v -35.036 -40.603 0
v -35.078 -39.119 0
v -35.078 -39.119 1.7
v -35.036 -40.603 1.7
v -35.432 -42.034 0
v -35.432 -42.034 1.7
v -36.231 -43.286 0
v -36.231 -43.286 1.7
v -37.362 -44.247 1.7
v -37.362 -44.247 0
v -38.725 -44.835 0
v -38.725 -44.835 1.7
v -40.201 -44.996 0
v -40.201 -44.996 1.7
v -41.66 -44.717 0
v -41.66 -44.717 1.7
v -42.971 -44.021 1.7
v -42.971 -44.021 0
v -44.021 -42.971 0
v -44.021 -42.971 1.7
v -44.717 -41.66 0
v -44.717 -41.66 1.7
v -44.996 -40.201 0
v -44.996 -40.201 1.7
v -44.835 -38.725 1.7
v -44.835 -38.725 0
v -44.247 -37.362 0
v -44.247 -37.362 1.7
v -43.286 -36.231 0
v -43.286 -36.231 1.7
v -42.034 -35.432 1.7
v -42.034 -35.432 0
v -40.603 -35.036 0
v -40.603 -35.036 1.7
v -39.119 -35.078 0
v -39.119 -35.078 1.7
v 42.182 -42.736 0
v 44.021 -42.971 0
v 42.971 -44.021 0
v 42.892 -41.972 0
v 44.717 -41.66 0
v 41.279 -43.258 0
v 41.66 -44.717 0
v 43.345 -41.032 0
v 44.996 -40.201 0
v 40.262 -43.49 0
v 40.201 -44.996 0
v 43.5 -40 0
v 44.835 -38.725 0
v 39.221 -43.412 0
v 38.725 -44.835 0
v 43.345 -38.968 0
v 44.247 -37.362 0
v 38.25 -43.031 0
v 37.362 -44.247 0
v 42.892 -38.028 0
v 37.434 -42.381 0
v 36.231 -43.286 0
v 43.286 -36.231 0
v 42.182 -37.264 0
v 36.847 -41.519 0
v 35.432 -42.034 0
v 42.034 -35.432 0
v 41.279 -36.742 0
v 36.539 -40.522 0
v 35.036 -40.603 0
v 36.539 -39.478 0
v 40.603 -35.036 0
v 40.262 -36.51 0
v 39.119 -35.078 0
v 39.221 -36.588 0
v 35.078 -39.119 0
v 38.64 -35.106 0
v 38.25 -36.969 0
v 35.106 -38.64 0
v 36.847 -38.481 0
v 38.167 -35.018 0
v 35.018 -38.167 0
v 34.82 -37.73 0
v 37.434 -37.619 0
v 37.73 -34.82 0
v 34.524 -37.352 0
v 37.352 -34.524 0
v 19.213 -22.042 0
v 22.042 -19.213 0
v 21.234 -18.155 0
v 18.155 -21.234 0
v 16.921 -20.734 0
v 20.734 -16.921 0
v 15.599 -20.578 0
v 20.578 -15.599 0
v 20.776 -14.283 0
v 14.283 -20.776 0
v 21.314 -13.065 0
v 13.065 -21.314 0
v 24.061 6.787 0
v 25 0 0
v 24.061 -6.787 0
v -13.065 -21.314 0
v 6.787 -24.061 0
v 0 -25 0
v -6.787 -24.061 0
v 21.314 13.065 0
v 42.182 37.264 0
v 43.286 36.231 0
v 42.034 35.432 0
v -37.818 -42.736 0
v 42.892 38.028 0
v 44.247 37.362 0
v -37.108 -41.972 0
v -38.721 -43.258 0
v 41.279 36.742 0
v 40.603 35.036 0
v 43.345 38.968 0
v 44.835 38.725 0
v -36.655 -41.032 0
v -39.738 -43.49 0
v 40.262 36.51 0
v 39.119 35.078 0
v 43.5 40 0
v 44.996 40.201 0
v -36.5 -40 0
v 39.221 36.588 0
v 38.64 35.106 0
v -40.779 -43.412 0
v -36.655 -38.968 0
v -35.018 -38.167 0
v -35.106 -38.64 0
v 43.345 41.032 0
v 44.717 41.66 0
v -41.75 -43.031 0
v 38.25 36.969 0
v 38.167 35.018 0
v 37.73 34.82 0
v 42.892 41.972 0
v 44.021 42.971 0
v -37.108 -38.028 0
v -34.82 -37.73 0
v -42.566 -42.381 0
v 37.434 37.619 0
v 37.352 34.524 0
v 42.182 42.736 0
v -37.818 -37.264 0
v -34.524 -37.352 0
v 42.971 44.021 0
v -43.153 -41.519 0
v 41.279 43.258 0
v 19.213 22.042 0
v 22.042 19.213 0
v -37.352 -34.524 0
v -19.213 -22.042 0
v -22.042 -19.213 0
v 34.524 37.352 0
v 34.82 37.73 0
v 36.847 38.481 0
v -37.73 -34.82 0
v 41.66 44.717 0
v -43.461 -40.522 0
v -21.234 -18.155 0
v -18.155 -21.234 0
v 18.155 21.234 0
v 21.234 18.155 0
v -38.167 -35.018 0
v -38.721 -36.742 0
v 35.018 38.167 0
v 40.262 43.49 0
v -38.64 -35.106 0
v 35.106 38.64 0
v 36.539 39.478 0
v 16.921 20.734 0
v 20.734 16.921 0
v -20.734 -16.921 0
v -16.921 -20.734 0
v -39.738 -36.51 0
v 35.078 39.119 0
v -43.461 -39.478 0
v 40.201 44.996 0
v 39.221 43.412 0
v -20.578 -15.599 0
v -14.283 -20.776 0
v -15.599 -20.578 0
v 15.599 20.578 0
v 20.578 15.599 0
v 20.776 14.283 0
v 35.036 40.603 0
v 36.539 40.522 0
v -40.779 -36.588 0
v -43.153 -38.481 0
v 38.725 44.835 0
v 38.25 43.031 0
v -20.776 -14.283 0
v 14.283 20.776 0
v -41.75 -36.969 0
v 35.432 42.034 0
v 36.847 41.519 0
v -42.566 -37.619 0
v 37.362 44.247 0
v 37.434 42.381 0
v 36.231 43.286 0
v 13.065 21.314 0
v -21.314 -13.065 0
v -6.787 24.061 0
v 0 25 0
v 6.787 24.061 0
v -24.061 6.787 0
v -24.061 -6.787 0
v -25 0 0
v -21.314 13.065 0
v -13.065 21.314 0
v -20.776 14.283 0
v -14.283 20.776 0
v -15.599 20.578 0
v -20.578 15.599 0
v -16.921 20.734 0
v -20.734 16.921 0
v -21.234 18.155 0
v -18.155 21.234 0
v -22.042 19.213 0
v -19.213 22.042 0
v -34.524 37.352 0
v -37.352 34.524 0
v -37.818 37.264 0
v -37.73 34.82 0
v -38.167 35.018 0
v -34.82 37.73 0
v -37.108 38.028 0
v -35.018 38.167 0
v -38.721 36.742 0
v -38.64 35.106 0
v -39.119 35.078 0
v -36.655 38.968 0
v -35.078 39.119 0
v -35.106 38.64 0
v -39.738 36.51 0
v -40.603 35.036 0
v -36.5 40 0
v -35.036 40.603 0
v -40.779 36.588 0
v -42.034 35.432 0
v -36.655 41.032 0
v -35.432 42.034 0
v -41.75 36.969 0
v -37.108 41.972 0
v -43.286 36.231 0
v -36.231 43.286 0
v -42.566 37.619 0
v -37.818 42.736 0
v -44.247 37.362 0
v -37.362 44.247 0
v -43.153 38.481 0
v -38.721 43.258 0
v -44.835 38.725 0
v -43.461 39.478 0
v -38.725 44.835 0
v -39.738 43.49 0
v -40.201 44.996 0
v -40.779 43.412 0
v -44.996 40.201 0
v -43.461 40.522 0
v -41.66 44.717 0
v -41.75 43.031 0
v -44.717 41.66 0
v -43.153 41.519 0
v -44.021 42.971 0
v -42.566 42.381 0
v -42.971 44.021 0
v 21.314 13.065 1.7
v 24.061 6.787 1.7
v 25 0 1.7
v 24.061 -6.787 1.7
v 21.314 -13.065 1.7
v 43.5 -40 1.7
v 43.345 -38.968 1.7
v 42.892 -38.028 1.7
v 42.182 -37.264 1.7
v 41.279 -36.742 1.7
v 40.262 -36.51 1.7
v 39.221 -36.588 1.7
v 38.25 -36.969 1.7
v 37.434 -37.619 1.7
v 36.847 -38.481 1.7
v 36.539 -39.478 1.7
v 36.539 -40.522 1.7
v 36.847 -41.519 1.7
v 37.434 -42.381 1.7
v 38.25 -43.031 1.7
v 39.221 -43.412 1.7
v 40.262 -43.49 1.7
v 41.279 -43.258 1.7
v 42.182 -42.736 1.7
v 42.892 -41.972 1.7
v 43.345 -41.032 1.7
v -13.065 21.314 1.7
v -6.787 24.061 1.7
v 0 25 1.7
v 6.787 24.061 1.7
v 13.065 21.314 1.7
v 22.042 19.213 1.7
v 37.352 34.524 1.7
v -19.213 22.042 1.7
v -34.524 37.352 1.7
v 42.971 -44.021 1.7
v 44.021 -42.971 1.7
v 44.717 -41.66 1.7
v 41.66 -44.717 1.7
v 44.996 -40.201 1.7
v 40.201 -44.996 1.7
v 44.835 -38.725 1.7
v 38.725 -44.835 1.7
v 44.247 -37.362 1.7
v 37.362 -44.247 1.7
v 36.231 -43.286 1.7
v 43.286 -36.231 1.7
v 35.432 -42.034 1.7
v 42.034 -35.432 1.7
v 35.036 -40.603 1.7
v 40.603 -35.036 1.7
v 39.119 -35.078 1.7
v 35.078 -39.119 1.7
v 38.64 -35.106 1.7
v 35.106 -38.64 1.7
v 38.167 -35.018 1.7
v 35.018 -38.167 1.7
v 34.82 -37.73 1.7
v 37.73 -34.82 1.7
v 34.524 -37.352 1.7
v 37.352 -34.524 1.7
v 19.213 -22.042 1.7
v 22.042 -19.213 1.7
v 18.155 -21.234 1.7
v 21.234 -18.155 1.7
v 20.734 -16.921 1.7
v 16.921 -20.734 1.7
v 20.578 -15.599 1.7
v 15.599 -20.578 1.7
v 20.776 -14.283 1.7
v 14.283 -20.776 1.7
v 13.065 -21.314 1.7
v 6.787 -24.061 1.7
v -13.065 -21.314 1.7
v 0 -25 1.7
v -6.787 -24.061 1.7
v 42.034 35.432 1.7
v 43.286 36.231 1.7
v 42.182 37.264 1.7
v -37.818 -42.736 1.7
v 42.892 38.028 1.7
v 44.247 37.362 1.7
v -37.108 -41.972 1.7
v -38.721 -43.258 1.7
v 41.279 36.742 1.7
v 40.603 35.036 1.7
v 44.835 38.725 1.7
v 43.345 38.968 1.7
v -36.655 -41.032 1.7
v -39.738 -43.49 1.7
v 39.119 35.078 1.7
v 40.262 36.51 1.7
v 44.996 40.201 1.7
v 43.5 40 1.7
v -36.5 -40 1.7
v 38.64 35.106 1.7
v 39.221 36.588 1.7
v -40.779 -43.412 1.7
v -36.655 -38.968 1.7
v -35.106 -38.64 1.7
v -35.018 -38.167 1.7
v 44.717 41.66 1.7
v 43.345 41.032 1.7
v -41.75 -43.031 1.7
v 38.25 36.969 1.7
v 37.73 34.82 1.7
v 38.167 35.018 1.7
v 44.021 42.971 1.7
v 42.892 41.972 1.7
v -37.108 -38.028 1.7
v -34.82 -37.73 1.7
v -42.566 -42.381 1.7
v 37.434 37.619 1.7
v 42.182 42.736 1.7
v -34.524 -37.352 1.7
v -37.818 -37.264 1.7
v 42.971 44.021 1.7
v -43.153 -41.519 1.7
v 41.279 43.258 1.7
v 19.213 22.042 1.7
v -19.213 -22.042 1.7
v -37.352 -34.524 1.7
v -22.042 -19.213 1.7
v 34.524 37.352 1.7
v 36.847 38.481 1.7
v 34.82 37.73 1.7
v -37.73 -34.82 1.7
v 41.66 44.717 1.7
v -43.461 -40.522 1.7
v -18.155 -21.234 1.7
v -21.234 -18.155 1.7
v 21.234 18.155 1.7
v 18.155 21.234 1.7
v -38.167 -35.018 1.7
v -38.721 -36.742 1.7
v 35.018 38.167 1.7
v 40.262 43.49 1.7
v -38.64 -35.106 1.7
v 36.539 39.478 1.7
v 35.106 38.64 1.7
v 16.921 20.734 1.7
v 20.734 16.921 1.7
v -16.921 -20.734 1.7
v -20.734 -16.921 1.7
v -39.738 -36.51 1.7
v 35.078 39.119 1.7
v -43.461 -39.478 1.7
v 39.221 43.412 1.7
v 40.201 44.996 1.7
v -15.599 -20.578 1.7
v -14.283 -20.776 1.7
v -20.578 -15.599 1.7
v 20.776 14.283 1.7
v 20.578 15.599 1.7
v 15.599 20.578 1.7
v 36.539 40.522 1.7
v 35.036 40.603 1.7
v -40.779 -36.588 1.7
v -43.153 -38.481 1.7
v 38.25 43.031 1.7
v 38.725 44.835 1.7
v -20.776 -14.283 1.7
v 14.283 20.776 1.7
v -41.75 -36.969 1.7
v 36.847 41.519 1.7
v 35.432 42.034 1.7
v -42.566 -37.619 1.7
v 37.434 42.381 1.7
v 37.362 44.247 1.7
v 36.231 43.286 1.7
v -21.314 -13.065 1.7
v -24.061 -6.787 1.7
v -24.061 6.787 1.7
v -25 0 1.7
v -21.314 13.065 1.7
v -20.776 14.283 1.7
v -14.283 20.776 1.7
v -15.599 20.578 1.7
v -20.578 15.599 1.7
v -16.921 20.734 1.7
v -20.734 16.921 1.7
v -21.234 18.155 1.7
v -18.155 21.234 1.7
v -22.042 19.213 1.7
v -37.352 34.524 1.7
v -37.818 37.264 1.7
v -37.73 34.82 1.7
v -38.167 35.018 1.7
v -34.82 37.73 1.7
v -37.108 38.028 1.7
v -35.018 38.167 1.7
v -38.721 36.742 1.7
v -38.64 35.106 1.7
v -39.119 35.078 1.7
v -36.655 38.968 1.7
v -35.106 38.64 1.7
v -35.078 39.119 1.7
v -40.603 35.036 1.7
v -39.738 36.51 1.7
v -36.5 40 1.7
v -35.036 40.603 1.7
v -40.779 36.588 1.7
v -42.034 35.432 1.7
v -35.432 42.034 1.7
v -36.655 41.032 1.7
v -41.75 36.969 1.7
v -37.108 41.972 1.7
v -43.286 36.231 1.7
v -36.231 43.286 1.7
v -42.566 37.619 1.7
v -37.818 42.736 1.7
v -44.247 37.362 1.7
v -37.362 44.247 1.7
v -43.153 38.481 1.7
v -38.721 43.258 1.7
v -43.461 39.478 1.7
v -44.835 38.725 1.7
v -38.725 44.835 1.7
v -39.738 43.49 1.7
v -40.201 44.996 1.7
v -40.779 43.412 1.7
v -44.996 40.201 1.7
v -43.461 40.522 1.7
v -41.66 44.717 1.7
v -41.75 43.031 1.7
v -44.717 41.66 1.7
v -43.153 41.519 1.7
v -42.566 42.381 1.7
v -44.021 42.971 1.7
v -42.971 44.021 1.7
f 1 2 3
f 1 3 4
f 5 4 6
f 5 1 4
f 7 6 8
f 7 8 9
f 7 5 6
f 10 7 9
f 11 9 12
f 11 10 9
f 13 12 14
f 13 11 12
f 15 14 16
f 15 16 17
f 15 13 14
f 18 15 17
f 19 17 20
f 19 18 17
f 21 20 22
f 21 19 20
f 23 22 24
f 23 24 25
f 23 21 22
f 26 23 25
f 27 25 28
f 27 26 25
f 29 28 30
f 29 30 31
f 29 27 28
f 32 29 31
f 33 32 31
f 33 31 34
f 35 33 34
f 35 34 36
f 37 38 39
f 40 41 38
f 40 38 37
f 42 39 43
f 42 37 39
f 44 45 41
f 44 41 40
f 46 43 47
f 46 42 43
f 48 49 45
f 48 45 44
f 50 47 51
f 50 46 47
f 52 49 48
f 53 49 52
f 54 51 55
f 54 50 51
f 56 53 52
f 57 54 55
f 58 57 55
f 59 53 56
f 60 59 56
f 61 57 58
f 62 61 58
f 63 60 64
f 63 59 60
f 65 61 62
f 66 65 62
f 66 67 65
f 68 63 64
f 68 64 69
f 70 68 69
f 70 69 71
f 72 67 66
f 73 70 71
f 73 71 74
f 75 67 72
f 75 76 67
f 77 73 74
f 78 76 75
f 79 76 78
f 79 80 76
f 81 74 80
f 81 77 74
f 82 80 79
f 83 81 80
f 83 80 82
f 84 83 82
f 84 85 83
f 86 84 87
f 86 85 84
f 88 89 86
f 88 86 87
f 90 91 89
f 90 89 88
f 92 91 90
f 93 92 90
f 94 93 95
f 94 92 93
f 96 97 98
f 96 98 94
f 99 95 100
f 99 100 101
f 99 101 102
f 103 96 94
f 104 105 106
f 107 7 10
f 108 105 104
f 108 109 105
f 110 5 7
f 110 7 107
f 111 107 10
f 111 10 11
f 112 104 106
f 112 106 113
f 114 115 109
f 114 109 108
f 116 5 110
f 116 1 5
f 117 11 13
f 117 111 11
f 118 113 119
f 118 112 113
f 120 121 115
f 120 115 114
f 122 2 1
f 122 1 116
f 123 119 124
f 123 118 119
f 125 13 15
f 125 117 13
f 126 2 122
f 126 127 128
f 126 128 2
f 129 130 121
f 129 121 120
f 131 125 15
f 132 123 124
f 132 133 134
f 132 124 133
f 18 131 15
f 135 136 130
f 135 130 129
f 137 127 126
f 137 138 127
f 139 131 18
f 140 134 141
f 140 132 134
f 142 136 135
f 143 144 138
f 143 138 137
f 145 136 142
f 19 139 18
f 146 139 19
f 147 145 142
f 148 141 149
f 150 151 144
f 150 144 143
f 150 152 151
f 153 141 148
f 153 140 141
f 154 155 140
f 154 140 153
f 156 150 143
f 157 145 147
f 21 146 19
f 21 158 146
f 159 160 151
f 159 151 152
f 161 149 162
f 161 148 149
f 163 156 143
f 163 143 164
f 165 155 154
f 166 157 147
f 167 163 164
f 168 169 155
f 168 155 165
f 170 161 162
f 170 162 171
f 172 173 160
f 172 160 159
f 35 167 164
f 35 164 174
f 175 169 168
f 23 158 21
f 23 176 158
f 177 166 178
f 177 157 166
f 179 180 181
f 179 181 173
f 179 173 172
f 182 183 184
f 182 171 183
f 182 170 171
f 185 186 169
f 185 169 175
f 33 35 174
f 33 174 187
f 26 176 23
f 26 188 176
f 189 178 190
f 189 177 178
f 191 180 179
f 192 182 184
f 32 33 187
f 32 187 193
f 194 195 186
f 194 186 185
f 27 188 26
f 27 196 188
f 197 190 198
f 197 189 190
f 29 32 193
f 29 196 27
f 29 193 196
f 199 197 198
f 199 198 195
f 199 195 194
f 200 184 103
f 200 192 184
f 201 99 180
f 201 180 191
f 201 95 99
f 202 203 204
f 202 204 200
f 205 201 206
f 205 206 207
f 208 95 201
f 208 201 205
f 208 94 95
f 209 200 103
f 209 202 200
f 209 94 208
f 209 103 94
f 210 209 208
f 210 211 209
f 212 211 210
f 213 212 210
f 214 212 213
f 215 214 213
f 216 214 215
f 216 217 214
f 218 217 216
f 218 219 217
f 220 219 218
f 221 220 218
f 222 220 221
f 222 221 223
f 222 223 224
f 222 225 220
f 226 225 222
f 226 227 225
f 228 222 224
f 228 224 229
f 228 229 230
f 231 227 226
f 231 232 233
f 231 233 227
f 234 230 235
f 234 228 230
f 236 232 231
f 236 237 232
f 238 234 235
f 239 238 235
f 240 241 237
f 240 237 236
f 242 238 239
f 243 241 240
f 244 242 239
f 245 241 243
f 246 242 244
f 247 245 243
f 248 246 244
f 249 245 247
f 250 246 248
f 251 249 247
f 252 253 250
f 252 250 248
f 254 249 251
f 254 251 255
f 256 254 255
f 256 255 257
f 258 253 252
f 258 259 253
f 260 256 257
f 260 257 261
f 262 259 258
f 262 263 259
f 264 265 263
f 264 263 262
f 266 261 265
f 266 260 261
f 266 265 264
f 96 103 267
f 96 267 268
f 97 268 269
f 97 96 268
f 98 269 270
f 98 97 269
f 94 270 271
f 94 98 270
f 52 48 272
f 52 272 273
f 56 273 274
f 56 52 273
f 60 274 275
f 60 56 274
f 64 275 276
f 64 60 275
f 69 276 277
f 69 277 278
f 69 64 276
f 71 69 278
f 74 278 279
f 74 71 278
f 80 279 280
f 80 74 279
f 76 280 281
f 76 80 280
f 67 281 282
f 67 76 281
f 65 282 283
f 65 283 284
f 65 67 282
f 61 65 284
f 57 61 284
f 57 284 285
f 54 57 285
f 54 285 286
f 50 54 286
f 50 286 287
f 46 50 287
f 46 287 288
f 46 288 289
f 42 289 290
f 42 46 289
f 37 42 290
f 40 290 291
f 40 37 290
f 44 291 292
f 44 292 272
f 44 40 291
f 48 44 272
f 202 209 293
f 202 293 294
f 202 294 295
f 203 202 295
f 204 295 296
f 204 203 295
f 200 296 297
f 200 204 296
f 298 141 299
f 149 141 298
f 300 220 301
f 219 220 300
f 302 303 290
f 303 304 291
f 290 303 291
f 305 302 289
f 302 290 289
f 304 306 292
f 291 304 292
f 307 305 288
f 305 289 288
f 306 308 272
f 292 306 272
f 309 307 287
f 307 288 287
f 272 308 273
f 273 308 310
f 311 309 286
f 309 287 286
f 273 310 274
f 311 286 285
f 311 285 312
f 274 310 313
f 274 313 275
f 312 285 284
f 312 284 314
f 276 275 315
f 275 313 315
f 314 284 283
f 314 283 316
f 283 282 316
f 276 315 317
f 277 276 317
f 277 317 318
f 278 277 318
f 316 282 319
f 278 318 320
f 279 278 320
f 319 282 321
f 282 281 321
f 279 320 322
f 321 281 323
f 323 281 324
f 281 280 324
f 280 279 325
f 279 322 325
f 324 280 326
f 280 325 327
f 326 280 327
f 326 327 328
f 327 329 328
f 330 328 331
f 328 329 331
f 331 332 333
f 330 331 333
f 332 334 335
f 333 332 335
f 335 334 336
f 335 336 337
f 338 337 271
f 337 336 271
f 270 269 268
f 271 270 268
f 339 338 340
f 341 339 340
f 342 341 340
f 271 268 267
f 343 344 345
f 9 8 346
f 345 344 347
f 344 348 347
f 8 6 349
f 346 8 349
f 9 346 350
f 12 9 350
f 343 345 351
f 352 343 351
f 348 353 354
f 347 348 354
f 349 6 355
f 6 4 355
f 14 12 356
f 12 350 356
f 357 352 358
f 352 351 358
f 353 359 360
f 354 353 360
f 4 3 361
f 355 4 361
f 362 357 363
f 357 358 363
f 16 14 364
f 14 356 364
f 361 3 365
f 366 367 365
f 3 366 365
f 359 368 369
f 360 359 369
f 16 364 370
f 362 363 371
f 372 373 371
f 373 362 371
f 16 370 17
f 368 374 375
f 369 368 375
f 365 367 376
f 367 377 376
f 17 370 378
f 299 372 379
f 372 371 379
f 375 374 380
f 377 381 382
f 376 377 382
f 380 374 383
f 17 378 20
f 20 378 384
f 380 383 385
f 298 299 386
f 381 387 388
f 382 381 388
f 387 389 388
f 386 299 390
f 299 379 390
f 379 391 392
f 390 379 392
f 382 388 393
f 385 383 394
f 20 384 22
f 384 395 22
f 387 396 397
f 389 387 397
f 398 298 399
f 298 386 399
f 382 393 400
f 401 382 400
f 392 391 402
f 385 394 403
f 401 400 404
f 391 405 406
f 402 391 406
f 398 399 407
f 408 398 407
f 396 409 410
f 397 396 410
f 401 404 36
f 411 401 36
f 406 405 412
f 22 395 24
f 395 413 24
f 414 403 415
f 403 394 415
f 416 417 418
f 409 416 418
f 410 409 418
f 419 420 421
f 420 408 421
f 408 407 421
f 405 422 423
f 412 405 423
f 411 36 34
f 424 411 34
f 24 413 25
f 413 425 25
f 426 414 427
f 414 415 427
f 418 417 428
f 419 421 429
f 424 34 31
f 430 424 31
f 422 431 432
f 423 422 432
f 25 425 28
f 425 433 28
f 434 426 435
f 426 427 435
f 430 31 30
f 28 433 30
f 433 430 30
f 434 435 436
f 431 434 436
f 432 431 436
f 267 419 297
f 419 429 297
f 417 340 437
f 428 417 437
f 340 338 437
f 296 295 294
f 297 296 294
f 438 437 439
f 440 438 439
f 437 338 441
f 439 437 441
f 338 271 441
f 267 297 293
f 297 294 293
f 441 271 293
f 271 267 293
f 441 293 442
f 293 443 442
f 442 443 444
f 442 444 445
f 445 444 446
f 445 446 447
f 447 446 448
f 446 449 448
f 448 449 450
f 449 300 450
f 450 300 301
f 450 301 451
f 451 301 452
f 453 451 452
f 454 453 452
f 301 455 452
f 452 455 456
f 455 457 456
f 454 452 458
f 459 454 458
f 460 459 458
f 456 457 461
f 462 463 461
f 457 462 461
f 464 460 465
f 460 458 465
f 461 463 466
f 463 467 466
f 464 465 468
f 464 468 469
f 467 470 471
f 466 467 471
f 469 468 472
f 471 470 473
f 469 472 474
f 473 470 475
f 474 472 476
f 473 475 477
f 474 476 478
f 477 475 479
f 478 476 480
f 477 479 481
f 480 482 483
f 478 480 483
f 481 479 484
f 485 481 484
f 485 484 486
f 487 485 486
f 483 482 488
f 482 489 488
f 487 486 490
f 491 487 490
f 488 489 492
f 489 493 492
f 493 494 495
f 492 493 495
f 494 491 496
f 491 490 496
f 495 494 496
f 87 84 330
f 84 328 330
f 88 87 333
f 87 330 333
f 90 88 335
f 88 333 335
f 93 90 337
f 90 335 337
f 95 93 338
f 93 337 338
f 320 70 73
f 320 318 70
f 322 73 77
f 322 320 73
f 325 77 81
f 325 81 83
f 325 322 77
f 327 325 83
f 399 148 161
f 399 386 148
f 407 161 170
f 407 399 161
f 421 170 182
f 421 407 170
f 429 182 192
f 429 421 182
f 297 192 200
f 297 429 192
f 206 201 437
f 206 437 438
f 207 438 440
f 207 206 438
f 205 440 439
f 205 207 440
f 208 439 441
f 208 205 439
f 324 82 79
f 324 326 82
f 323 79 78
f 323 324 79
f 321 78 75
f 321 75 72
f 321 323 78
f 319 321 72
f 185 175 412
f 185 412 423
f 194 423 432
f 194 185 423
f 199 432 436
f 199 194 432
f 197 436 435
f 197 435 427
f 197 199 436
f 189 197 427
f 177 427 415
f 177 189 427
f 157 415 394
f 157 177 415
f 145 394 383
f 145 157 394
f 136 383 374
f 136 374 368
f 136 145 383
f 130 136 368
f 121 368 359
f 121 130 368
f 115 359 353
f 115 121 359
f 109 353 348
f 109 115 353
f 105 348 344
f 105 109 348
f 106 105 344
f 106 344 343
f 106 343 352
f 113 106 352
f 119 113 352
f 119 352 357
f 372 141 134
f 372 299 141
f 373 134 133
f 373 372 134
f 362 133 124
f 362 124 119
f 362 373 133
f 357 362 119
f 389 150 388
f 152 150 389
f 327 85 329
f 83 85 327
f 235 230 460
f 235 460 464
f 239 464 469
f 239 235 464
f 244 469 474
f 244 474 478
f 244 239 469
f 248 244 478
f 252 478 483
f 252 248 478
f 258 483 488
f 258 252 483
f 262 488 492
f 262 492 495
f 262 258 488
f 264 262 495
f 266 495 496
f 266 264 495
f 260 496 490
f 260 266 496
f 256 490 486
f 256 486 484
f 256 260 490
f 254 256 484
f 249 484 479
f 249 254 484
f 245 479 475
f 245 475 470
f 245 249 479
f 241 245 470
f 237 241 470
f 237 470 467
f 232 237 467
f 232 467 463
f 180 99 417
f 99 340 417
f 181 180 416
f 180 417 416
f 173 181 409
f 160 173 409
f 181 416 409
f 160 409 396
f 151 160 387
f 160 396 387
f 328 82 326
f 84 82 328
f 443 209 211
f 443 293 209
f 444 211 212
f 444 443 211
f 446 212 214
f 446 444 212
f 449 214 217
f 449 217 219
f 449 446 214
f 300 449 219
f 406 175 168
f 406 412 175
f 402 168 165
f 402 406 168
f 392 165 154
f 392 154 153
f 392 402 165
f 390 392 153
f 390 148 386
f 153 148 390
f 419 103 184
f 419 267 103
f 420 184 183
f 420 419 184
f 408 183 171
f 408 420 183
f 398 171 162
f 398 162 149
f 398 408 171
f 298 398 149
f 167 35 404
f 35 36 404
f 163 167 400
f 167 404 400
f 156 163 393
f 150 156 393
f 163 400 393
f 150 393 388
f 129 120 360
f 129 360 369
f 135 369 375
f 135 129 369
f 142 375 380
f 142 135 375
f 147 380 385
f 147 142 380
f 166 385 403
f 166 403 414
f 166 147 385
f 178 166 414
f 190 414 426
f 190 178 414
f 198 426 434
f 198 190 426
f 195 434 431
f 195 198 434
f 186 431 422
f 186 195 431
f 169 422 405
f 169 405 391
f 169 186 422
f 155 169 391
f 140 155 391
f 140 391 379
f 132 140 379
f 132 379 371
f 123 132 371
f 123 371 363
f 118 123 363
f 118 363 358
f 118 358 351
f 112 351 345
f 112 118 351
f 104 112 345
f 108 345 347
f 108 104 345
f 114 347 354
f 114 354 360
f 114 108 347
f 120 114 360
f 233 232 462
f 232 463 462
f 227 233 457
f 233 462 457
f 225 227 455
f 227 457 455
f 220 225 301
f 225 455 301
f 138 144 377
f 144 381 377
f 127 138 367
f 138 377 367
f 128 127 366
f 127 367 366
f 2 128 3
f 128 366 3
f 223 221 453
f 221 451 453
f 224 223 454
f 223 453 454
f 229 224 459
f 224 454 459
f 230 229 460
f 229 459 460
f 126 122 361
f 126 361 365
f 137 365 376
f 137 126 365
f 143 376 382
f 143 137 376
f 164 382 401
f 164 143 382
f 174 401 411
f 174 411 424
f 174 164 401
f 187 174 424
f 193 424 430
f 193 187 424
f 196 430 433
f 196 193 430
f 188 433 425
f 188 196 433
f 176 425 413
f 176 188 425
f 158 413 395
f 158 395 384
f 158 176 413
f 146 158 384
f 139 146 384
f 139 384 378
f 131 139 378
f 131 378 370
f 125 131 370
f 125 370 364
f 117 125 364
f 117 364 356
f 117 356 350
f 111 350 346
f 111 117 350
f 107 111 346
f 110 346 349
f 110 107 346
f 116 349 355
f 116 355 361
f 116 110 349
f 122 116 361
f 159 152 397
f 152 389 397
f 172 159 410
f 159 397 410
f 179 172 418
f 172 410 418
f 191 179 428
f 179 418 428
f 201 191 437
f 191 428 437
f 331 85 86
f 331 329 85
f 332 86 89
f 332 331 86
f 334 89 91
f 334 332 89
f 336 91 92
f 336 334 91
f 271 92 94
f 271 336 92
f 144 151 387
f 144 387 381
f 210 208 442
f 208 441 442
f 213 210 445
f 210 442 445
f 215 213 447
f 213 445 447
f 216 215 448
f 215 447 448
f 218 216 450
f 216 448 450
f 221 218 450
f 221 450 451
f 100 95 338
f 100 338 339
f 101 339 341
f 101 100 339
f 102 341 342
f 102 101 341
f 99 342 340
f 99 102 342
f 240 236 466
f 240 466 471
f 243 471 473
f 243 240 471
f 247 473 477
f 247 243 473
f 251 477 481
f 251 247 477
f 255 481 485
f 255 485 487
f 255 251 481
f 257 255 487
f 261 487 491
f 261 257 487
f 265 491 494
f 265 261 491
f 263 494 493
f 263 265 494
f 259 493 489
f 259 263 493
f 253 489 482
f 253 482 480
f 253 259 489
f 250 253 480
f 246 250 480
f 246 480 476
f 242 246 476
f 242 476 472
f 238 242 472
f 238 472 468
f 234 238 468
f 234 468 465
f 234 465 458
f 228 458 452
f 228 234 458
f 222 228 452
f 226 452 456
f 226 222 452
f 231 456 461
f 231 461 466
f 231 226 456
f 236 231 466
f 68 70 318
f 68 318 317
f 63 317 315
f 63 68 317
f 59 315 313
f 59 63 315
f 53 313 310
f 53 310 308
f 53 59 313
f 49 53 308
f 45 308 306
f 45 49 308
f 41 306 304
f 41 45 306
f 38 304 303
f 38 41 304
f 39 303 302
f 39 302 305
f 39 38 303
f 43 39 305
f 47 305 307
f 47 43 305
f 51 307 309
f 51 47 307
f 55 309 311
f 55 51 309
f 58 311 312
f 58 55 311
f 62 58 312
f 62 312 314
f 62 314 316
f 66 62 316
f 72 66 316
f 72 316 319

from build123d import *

# Parameters (mm, degrees)
SKETCH1_R           = 3.5
BOSS_EXTRUDE2_DEPTH = 1.7
FILLET1_R           = 5
FILLET2_R           = 2


with BuildPart() as part:
    # Sketch1 → Boss-Extrude2 (new body)
    with BuildSketch(Plane.XY):
        with BuildLine():
            Line((35.345416088, -38.173843213), (16.206796624, -19.035223749))
            ThreePointArc((16.206796624, -19.035223749), (0, -25), (-16.206796624, -19.035223749))
            Line((-16.206796624, -19.035223749), (-35.345416088, -38.173843213))
            ThreePointArc((-35.345416088, -38.173843213), (-43.535533906, -43.535533906), (-38.173843213, -35.345416088))
            Line((-38.173843213, -35.345416088), (-19.035223749, -16.206796624))
            ThreePointArc((-19.035223749, -16.206796624), (-25, 0), (-19.035223749, 16.206796624))
            Line((-19.035223749, 16.206796624), (-38.173843213, 35.345416088))
            ThreePointArc((-38.173843213, 35.345416088), (-43.535533906, 43.535533906), (-35.345416088, 38.173843213))
            Line((-35.345416088, 38.173843213), (-16.206796624, 19.035223749))
            ThreePointArc((-16.206796624, 19.035223749), (0, 25), (16.206796624, 19.035223749))
            Line((16.206796624, 19.035223749), (35.345416088, 38.173843213))
            ThreePointArc((35.345416088, 38.173843213), (43.535533906, 43.535533906), (38.173843213, 35.345416088))
            Line((38.173843213, 35.345416088), (19.035223749, 16.206796624))
            ThreePointArc((19.035223749, 16.206796624), (25, 0), (19.035223749, -16.206796624))
            Line((19.035223749, -16.206796624), (38.173843213, -35.345416088))
            ThreePointArc((38.173843213, -35.345416088), (43.535533906, -43.535533906), (35.345416088, -38.173843213))
        make_face()
        with Locations((-40, 40)):
            Circle(SKETCH1_R, mode=Mode.SUBTRACT)
        with Locations((40, 40)):
            Circle(SKETCH1_R, mode=Mode.SUBTRACT)
        with Locations((40, -40)):
            Circle(SKETCH1_R, mode=Mode.SUBTRACT)
        with Locations((-40, -40)):
            Circle(SKETCH1_R, mode=Mode.SUBTRACT)
    extrude(amount=BOSS_EXTRUDE2_DEPTH)

    # Fillet1
    fillet1_edges = [part.edges().sort_by_distance(p)[0] for p in [
        (16.206796624, 19.035223749, 0.85),
        (19.035223749, 16.206796624, 0.85),
        (19.035223749, -16.206796624, 0.85),
        (16.206796624, -19.035223749, 0.85),
        (-16.206796624, -19.035223749, 0.85),
        (-19.035223749, -16.206796624, 0.85),
        (-19.035223749, 16.206796624, 0.85),
        (-16.206796624, 19.035223749, 0.85),
    ]]
    fillet(fillet1_edges, radius=FILLET1_R)

    # Fillet2
    fillet2_edges = [part.edges().sort_by_distance(p)[0] for p in [
        (35.345416088, 38.173843213, 0.85),
        (38.173843213, 35.345416088, 0.85),
        (38.173843213, -35.345416088, 0.85),
        (35.345416088, -38.173843213, 0.85),
        (-35.345416088, -38.173843213, 0.85),
        (-38.173843213, -35.345416088, 0.85),
        (-38.173843213, 35.345416088, 0.85),
        (-35.345416088, 38.173843213, 0.85),
    ]]
    fillet(fillet2_edges, radius=FILLET2_R)


solid = part.part
